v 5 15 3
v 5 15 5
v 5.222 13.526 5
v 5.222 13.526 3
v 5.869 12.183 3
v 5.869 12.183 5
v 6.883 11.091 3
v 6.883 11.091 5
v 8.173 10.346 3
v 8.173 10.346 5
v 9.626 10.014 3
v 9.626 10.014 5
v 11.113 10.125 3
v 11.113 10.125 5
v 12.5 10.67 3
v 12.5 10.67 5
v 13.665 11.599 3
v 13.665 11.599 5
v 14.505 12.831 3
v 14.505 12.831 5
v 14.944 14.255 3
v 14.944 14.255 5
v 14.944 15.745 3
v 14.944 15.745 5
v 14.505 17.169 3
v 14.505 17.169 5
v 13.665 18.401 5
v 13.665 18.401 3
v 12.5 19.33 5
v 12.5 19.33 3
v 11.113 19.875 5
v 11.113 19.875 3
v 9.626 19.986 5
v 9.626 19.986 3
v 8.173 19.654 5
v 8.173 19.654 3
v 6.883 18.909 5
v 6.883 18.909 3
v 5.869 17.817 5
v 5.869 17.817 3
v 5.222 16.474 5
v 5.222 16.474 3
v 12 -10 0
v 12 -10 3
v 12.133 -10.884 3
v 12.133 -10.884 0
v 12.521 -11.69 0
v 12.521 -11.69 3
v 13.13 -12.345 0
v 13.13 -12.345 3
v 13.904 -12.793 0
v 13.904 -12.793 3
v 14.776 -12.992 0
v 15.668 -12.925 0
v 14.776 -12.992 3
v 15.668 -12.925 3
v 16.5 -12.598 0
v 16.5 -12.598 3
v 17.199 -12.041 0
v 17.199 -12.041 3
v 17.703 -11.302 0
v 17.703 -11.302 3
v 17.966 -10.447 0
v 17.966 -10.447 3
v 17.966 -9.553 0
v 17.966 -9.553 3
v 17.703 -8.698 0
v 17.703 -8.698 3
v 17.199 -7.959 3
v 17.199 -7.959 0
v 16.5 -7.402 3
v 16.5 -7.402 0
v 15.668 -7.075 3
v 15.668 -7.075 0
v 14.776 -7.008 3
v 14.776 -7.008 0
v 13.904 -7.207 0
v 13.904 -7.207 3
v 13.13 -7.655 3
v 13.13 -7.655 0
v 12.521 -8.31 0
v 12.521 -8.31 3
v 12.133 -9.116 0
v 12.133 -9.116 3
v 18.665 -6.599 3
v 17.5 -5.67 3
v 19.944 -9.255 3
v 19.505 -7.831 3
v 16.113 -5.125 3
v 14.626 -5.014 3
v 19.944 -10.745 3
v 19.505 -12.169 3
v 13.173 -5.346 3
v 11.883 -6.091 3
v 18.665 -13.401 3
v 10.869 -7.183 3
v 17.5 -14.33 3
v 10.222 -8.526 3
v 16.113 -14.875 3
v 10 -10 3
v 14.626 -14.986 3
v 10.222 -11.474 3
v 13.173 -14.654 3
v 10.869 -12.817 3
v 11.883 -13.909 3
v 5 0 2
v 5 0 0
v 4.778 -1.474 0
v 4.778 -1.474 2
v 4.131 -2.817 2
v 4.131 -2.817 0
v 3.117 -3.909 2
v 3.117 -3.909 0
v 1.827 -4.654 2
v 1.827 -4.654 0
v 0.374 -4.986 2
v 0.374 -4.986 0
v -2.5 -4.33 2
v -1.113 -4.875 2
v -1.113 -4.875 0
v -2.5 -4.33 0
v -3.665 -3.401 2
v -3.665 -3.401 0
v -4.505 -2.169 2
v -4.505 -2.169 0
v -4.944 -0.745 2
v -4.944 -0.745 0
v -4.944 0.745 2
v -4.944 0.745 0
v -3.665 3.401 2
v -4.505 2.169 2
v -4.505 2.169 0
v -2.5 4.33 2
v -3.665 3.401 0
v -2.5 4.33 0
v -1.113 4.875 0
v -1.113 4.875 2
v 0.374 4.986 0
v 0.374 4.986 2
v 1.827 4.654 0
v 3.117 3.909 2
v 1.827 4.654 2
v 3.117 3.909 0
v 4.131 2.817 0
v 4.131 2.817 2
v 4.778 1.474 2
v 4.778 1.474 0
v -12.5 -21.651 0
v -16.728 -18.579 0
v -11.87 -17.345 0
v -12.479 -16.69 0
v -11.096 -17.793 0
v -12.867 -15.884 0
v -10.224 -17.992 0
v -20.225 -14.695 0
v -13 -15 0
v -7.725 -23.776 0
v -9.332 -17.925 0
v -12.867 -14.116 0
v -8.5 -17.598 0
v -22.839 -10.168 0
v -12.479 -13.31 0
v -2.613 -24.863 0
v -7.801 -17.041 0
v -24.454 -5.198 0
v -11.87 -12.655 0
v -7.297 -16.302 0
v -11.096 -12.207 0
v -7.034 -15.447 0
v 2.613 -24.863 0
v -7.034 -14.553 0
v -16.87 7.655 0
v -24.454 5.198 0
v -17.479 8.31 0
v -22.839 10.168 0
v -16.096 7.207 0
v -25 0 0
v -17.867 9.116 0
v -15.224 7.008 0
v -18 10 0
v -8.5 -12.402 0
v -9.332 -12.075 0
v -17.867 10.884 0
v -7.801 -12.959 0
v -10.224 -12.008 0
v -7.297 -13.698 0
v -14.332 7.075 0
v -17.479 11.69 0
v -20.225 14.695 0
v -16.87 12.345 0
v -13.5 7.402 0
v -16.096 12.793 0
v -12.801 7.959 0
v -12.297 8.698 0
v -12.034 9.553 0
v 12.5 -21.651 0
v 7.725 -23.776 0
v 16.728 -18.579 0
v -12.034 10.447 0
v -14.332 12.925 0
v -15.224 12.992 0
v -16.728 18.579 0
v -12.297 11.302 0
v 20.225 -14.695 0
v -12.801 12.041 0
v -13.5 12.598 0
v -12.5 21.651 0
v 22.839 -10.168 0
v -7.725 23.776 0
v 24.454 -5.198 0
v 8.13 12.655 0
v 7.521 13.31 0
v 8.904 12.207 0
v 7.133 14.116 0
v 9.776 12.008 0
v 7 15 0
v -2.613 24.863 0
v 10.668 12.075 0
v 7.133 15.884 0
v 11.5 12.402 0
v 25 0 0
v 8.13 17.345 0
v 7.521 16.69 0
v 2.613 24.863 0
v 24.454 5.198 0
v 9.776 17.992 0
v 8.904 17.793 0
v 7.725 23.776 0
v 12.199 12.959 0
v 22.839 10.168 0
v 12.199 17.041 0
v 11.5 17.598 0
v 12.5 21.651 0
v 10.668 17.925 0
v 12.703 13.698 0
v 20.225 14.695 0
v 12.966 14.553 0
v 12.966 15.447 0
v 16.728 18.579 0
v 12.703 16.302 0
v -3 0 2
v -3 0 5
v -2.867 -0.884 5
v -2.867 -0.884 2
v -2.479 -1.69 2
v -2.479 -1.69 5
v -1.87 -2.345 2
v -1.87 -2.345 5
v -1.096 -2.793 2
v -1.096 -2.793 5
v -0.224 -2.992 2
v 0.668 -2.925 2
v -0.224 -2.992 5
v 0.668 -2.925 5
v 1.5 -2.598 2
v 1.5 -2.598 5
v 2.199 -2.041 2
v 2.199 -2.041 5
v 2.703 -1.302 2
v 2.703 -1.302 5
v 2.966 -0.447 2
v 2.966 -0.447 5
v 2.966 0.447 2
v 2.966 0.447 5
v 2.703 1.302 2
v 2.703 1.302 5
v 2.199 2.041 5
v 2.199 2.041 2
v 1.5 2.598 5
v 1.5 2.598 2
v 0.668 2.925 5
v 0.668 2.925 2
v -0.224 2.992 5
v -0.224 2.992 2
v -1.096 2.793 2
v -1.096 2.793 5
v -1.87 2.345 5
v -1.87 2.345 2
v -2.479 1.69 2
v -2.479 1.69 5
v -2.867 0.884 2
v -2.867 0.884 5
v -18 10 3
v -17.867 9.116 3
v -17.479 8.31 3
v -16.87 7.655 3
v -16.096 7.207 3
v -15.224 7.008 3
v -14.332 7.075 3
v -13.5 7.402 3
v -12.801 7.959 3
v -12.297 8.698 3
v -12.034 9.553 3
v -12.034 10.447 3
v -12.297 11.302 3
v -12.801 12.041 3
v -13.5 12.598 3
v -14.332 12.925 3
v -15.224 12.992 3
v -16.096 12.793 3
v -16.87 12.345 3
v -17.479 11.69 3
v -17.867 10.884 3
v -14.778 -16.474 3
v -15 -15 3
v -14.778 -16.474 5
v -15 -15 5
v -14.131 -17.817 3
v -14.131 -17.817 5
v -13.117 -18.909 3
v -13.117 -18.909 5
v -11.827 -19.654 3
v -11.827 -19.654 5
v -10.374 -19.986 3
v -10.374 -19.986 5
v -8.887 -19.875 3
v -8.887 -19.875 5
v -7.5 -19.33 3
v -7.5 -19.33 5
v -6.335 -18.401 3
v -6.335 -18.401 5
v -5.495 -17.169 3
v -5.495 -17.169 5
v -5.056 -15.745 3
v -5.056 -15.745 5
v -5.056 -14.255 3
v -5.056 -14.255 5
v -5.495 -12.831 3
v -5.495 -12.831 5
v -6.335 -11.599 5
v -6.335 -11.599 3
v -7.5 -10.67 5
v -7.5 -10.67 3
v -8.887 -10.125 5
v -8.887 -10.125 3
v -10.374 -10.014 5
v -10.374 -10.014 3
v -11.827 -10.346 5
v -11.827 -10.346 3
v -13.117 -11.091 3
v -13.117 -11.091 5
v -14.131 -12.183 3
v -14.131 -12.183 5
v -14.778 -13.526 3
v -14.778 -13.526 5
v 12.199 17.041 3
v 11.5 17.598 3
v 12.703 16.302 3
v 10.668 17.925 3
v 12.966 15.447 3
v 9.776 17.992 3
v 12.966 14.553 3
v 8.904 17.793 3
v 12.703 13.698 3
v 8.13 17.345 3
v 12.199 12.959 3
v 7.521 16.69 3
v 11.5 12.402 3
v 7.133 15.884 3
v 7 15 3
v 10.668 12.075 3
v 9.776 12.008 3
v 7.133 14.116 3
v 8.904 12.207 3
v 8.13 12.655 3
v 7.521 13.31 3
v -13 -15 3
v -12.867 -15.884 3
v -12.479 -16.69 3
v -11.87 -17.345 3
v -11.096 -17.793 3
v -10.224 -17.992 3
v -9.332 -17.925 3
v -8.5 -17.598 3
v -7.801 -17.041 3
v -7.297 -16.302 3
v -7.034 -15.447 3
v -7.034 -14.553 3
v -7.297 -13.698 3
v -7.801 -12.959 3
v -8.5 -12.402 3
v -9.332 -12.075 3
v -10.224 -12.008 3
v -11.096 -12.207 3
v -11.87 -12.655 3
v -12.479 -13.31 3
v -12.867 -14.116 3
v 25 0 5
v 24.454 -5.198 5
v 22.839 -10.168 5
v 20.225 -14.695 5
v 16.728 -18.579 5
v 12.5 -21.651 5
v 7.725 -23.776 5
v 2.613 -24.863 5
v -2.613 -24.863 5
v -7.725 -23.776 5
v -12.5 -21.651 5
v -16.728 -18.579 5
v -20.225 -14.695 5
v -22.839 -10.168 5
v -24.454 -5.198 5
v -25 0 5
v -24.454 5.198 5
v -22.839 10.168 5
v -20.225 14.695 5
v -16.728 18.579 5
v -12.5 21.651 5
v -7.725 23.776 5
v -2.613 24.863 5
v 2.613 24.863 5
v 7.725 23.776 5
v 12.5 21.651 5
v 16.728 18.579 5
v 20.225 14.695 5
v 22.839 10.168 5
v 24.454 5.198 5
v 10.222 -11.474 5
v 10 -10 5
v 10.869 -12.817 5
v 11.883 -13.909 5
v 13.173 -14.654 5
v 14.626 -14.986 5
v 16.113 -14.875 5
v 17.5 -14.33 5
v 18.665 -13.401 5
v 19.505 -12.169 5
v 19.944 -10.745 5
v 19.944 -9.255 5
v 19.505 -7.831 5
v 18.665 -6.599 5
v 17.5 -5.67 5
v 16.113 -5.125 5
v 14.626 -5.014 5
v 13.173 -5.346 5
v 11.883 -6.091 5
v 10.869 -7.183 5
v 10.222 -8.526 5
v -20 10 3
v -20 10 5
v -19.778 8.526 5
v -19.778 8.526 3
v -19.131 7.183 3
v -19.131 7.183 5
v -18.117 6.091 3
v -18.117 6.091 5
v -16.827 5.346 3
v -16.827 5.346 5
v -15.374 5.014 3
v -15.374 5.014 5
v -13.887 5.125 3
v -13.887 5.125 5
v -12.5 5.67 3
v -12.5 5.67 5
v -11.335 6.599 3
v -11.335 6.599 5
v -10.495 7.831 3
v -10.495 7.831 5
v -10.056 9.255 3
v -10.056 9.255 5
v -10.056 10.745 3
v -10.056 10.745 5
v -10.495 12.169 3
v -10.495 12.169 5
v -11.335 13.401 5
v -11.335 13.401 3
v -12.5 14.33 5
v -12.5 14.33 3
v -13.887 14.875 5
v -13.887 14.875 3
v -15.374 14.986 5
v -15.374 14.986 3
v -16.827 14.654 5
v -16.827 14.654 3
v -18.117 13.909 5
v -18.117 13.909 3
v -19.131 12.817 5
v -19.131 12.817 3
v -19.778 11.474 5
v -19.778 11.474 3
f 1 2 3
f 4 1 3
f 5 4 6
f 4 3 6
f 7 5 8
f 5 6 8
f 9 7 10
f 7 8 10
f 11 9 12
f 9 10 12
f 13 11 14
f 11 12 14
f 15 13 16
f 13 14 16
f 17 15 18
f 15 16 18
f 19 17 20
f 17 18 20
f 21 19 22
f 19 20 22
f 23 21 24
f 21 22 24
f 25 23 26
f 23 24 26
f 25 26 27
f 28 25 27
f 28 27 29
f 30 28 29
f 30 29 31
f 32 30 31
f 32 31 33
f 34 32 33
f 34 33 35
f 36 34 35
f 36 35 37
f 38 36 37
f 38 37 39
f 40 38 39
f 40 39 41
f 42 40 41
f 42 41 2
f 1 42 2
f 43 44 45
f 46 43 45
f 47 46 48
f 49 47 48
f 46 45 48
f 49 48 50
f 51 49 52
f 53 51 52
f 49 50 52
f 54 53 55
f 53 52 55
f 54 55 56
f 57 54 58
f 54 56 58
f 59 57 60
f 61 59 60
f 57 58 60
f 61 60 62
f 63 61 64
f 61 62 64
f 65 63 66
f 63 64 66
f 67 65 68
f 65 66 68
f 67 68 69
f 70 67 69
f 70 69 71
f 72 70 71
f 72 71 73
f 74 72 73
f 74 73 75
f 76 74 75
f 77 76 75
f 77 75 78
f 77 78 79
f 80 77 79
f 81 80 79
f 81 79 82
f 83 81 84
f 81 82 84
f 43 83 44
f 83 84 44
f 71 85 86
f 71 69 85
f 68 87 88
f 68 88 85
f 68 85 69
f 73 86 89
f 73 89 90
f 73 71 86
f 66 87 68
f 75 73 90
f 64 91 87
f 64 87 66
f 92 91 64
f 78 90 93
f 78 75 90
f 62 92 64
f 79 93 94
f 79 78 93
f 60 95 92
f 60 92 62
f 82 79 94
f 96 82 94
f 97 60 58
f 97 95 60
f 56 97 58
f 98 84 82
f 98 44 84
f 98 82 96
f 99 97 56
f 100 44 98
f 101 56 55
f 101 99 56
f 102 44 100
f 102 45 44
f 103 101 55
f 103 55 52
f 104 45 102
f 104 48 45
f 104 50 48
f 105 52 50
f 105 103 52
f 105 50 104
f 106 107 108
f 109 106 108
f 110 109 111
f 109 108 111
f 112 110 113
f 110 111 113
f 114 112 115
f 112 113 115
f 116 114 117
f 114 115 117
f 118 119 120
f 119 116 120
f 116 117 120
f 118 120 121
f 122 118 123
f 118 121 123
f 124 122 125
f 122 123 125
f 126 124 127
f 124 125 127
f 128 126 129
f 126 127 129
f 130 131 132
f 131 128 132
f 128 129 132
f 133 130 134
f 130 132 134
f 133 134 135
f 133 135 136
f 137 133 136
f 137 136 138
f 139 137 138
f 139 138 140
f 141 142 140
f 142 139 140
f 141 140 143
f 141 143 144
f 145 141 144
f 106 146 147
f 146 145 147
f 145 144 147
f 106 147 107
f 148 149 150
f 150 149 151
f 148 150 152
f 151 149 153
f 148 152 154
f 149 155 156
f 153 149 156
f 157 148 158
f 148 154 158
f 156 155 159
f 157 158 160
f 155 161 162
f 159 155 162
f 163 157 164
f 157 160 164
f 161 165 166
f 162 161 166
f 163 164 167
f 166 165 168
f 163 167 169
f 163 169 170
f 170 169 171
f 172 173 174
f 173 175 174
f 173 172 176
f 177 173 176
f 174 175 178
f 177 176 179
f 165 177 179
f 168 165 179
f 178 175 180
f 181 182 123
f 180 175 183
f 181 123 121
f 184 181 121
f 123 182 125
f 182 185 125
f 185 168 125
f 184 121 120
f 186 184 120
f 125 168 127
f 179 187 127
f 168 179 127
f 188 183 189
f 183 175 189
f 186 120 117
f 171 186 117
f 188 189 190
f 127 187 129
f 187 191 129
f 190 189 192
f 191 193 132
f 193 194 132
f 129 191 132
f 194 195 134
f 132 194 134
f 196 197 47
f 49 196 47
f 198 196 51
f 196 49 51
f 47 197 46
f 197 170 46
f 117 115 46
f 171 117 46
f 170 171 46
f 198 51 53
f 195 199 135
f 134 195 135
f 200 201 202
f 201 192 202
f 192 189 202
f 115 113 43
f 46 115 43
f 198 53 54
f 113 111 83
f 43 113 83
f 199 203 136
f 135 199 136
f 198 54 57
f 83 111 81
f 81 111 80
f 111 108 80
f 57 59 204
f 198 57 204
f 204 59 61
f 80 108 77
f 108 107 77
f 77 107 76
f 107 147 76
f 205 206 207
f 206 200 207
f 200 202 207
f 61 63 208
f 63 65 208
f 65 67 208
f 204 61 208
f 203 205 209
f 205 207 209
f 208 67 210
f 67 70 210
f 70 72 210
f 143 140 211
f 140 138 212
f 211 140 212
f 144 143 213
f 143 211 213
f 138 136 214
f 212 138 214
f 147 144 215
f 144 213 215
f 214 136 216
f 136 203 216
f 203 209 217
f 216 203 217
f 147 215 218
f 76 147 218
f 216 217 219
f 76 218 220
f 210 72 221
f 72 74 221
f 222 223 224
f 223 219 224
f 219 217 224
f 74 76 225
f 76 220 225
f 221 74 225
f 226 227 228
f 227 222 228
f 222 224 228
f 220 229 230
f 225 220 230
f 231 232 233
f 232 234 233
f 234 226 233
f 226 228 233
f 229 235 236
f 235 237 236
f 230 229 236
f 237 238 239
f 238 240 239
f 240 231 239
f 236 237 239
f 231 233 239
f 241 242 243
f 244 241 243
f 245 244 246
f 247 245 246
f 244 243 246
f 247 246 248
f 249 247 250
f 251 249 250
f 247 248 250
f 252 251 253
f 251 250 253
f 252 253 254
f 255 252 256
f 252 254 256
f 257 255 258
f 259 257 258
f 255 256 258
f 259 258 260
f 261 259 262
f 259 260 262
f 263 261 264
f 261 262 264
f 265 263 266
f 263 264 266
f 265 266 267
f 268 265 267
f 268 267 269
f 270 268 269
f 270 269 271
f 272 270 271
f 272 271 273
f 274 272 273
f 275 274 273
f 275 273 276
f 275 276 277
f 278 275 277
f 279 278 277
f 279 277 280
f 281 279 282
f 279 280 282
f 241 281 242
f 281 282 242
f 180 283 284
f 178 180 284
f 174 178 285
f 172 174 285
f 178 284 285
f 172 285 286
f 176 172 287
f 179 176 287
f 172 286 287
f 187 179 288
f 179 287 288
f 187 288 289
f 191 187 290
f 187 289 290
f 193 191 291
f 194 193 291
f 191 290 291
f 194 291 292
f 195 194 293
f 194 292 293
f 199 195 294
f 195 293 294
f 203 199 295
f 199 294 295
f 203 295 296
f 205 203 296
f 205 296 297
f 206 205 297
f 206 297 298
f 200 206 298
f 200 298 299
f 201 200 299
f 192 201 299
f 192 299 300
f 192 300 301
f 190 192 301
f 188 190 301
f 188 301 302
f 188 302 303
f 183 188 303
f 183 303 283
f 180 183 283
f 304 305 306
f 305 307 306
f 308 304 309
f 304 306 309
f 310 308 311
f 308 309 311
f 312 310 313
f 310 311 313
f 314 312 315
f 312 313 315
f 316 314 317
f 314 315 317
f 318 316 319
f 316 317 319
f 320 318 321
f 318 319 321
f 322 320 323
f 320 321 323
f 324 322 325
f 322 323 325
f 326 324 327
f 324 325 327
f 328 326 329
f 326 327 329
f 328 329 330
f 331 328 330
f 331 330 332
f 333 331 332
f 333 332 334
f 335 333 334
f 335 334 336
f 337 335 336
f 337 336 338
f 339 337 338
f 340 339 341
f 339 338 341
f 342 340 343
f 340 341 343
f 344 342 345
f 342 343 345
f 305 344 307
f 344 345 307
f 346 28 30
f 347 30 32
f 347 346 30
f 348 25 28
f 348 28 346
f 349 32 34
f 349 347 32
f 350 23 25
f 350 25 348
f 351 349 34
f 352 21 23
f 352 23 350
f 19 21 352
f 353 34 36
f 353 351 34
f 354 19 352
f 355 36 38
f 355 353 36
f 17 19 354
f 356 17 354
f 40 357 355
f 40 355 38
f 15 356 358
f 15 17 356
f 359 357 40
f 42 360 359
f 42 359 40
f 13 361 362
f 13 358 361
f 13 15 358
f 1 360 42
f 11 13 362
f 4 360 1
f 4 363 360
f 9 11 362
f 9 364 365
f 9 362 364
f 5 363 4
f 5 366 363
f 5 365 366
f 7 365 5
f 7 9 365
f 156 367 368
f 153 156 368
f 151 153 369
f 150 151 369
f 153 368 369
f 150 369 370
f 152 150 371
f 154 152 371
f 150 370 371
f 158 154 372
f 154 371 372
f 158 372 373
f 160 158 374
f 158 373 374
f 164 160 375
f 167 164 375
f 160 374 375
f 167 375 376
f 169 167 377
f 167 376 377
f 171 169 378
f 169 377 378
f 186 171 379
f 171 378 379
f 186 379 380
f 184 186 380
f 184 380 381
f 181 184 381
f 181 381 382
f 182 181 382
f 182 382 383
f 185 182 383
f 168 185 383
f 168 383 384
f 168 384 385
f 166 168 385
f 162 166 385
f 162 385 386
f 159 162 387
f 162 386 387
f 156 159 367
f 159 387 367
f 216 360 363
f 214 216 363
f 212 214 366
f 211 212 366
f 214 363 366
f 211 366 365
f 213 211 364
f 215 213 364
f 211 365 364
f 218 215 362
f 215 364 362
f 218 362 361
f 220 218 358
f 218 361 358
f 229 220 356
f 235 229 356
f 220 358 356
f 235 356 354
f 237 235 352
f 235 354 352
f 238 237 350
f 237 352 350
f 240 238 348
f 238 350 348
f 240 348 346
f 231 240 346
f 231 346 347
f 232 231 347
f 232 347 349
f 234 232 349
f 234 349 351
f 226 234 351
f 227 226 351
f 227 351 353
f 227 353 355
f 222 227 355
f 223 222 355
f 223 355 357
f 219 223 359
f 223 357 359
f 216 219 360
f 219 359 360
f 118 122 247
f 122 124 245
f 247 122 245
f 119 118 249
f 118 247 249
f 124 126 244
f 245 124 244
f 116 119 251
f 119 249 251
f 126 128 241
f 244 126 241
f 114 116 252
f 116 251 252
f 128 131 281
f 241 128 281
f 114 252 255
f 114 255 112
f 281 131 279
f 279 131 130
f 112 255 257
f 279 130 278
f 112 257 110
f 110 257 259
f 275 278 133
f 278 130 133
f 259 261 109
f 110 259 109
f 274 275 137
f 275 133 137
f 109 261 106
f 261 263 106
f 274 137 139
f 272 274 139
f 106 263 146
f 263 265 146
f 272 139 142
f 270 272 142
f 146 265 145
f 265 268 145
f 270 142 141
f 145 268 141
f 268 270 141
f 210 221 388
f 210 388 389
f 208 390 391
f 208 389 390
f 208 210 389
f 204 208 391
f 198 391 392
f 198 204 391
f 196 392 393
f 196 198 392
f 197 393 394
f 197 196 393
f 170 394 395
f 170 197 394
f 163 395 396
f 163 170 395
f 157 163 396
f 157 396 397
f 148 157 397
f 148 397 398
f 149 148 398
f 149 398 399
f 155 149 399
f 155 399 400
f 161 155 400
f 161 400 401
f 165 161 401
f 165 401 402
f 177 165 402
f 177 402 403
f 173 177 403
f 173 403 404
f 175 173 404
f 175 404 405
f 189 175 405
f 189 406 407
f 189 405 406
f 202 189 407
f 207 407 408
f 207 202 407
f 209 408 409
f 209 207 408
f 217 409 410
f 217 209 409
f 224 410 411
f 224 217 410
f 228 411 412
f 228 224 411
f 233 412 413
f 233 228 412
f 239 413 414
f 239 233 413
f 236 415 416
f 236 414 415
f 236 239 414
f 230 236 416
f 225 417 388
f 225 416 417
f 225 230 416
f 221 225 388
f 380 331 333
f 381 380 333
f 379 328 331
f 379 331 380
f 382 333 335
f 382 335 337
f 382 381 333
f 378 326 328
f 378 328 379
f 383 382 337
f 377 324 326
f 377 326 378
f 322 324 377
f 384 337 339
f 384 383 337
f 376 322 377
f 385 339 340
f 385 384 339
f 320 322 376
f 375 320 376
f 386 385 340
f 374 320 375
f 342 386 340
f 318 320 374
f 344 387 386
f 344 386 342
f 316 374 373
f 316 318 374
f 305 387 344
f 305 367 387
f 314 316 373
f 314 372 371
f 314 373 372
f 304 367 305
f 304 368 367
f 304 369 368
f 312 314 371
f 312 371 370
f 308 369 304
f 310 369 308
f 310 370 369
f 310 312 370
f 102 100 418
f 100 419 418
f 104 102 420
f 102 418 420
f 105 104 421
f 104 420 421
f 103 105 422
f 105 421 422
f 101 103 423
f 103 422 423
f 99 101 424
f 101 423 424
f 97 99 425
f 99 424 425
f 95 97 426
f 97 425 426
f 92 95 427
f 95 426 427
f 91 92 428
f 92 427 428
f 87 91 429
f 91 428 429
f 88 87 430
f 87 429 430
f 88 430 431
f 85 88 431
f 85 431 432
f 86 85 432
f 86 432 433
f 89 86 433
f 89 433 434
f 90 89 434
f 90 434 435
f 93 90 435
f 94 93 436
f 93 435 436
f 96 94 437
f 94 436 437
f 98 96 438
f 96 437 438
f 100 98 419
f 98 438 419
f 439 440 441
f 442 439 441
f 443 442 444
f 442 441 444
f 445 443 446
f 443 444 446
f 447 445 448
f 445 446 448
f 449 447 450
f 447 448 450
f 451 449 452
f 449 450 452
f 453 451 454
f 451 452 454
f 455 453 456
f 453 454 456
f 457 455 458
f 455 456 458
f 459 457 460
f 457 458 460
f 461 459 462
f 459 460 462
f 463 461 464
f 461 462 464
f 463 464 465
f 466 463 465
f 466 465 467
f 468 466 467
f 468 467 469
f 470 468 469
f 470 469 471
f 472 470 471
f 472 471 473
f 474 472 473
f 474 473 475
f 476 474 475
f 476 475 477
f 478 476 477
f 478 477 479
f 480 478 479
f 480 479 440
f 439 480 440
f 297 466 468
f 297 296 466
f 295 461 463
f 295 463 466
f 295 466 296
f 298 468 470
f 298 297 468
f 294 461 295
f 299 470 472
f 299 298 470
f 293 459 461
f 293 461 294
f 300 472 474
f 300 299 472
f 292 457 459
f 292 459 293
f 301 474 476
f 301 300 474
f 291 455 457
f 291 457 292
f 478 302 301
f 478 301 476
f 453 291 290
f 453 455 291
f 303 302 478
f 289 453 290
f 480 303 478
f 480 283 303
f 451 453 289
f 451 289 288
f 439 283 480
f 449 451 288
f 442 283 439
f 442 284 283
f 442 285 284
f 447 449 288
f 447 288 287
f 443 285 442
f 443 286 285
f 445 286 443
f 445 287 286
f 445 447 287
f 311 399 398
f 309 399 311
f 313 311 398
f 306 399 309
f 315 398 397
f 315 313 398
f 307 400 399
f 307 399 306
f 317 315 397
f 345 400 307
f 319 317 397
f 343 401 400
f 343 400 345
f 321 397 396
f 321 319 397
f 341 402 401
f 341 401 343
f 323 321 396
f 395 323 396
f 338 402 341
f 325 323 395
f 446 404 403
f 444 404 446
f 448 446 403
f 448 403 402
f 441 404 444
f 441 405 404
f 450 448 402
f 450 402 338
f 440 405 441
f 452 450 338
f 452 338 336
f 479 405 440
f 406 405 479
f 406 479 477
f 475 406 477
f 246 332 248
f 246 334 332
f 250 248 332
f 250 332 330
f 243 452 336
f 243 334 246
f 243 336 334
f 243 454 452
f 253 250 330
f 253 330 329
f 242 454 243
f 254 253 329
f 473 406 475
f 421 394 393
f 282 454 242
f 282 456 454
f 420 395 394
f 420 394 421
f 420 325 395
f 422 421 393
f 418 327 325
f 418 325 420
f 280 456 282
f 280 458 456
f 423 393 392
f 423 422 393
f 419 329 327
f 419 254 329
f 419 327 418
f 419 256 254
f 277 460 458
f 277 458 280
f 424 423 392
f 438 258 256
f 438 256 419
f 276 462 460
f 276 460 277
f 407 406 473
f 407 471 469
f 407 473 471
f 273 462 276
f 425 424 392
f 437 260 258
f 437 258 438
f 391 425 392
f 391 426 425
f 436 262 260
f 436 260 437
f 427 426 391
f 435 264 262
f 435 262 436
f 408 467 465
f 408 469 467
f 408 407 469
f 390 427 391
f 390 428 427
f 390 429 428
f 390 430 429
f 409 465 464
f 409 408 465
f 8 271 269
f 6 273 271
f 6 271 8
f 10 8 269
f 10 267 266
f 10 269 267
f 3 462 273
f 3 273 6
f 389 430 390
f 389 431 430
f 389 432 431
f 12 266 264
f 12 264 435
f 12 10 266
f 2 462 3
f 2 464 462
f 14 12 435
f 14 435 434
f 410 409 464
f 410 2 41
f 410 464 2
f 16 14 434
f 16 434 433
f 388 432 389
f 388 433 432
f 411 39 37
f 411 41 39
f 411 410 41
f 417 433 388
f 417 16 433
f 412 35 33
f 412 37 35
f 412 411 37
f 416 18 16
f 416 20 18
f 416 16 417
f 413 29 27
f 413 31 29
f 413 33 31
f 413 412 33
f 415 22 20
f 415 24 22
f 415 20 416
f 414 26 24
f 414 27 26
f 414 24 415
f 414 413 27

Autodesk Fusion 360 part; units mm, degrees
sketch "Sketch1" plane through (0, 0, 0) normal (0, 0, 1) x (1, 0, 0)
  circle A0 centre (0, 0) radius 25
  dimension "d1" = 50
extrude "Extrude1" add sketch "Sketch1" along normal blind 5
sketch "Sketch2" plane through (0, 0, 5) normal (0, 0, 1) x (-1, 0, 0)
  circle A0 centre (0, 0) radius 25
  circle A1 centre (15, -10) radius 3
  circle A2 centre (-10, -15) radius 3
  circle A3 centre (-15, 10) radius 3
  circle A4 centre (10, 15) radius 3
  dimension "d4" = 6
  dimension "d5" = 6
  dimension "d6" = 6
  dimension "d7" = 6
extrude "Extrude2" cut sketch "Sketch2" against normal blind 5 contours A1 | A2 | A3 | A4
sketch "Sketch3" plane through (0, 0, 5) normal (0, 0, 1) x (-1, 0, 0)
  circle A0 centre (-10, -15) radius 3
  circle A1 centre (-15, 10) radius 3
  circle A2 centre (15, -10) radius 3
  circle A3 centre (10, 15) radius 3
  circle A4 centre (0, 0) radius 25
  circle A5 centre (15, -10) radius 5
  circle A6 centre (-10, -15) radius 5
  circle A7 centre (-15, 10) radius 5
  circle A8 centre (10, 15) radius 5
  dimension "d10" = 10
  dimension "d11" = 10
  dimension "d12" = 10
  dimension "d13" = 10
extrude "Extrude3" cut sketch "Sketch3" against normal blind 2 contours A5 | A6 | A7 | A8
sketch "Sketch4" plane through (0, 0, 5) normal (0, 0, 1) x (-1, 0, 0)
  circle A0 centre (-10, -15) radius 5
  circle A1 centre (-15, 10) radius 5
  circle A2 centre (15, -10) radius 5
  circle A3 centre (10, 15) radius 5
  circle A4 centre (0, 0) radius 25
  circle A5 centre (0, 0) radius 3
  dimension "d16" = 6
extrude "Extrude4" cut sketch "Sketch4" against normal blind 21 contours A5
sketch "Sketch5" plane through (0, 0, 0) normal (0, 0, 1) x (1, 0, 0)
  circle A0 centre (0, 0) radius 5
  dimension "d19" = 10
extrude "Extrude5" cut sketch "Sketch5" along normal blind 2
